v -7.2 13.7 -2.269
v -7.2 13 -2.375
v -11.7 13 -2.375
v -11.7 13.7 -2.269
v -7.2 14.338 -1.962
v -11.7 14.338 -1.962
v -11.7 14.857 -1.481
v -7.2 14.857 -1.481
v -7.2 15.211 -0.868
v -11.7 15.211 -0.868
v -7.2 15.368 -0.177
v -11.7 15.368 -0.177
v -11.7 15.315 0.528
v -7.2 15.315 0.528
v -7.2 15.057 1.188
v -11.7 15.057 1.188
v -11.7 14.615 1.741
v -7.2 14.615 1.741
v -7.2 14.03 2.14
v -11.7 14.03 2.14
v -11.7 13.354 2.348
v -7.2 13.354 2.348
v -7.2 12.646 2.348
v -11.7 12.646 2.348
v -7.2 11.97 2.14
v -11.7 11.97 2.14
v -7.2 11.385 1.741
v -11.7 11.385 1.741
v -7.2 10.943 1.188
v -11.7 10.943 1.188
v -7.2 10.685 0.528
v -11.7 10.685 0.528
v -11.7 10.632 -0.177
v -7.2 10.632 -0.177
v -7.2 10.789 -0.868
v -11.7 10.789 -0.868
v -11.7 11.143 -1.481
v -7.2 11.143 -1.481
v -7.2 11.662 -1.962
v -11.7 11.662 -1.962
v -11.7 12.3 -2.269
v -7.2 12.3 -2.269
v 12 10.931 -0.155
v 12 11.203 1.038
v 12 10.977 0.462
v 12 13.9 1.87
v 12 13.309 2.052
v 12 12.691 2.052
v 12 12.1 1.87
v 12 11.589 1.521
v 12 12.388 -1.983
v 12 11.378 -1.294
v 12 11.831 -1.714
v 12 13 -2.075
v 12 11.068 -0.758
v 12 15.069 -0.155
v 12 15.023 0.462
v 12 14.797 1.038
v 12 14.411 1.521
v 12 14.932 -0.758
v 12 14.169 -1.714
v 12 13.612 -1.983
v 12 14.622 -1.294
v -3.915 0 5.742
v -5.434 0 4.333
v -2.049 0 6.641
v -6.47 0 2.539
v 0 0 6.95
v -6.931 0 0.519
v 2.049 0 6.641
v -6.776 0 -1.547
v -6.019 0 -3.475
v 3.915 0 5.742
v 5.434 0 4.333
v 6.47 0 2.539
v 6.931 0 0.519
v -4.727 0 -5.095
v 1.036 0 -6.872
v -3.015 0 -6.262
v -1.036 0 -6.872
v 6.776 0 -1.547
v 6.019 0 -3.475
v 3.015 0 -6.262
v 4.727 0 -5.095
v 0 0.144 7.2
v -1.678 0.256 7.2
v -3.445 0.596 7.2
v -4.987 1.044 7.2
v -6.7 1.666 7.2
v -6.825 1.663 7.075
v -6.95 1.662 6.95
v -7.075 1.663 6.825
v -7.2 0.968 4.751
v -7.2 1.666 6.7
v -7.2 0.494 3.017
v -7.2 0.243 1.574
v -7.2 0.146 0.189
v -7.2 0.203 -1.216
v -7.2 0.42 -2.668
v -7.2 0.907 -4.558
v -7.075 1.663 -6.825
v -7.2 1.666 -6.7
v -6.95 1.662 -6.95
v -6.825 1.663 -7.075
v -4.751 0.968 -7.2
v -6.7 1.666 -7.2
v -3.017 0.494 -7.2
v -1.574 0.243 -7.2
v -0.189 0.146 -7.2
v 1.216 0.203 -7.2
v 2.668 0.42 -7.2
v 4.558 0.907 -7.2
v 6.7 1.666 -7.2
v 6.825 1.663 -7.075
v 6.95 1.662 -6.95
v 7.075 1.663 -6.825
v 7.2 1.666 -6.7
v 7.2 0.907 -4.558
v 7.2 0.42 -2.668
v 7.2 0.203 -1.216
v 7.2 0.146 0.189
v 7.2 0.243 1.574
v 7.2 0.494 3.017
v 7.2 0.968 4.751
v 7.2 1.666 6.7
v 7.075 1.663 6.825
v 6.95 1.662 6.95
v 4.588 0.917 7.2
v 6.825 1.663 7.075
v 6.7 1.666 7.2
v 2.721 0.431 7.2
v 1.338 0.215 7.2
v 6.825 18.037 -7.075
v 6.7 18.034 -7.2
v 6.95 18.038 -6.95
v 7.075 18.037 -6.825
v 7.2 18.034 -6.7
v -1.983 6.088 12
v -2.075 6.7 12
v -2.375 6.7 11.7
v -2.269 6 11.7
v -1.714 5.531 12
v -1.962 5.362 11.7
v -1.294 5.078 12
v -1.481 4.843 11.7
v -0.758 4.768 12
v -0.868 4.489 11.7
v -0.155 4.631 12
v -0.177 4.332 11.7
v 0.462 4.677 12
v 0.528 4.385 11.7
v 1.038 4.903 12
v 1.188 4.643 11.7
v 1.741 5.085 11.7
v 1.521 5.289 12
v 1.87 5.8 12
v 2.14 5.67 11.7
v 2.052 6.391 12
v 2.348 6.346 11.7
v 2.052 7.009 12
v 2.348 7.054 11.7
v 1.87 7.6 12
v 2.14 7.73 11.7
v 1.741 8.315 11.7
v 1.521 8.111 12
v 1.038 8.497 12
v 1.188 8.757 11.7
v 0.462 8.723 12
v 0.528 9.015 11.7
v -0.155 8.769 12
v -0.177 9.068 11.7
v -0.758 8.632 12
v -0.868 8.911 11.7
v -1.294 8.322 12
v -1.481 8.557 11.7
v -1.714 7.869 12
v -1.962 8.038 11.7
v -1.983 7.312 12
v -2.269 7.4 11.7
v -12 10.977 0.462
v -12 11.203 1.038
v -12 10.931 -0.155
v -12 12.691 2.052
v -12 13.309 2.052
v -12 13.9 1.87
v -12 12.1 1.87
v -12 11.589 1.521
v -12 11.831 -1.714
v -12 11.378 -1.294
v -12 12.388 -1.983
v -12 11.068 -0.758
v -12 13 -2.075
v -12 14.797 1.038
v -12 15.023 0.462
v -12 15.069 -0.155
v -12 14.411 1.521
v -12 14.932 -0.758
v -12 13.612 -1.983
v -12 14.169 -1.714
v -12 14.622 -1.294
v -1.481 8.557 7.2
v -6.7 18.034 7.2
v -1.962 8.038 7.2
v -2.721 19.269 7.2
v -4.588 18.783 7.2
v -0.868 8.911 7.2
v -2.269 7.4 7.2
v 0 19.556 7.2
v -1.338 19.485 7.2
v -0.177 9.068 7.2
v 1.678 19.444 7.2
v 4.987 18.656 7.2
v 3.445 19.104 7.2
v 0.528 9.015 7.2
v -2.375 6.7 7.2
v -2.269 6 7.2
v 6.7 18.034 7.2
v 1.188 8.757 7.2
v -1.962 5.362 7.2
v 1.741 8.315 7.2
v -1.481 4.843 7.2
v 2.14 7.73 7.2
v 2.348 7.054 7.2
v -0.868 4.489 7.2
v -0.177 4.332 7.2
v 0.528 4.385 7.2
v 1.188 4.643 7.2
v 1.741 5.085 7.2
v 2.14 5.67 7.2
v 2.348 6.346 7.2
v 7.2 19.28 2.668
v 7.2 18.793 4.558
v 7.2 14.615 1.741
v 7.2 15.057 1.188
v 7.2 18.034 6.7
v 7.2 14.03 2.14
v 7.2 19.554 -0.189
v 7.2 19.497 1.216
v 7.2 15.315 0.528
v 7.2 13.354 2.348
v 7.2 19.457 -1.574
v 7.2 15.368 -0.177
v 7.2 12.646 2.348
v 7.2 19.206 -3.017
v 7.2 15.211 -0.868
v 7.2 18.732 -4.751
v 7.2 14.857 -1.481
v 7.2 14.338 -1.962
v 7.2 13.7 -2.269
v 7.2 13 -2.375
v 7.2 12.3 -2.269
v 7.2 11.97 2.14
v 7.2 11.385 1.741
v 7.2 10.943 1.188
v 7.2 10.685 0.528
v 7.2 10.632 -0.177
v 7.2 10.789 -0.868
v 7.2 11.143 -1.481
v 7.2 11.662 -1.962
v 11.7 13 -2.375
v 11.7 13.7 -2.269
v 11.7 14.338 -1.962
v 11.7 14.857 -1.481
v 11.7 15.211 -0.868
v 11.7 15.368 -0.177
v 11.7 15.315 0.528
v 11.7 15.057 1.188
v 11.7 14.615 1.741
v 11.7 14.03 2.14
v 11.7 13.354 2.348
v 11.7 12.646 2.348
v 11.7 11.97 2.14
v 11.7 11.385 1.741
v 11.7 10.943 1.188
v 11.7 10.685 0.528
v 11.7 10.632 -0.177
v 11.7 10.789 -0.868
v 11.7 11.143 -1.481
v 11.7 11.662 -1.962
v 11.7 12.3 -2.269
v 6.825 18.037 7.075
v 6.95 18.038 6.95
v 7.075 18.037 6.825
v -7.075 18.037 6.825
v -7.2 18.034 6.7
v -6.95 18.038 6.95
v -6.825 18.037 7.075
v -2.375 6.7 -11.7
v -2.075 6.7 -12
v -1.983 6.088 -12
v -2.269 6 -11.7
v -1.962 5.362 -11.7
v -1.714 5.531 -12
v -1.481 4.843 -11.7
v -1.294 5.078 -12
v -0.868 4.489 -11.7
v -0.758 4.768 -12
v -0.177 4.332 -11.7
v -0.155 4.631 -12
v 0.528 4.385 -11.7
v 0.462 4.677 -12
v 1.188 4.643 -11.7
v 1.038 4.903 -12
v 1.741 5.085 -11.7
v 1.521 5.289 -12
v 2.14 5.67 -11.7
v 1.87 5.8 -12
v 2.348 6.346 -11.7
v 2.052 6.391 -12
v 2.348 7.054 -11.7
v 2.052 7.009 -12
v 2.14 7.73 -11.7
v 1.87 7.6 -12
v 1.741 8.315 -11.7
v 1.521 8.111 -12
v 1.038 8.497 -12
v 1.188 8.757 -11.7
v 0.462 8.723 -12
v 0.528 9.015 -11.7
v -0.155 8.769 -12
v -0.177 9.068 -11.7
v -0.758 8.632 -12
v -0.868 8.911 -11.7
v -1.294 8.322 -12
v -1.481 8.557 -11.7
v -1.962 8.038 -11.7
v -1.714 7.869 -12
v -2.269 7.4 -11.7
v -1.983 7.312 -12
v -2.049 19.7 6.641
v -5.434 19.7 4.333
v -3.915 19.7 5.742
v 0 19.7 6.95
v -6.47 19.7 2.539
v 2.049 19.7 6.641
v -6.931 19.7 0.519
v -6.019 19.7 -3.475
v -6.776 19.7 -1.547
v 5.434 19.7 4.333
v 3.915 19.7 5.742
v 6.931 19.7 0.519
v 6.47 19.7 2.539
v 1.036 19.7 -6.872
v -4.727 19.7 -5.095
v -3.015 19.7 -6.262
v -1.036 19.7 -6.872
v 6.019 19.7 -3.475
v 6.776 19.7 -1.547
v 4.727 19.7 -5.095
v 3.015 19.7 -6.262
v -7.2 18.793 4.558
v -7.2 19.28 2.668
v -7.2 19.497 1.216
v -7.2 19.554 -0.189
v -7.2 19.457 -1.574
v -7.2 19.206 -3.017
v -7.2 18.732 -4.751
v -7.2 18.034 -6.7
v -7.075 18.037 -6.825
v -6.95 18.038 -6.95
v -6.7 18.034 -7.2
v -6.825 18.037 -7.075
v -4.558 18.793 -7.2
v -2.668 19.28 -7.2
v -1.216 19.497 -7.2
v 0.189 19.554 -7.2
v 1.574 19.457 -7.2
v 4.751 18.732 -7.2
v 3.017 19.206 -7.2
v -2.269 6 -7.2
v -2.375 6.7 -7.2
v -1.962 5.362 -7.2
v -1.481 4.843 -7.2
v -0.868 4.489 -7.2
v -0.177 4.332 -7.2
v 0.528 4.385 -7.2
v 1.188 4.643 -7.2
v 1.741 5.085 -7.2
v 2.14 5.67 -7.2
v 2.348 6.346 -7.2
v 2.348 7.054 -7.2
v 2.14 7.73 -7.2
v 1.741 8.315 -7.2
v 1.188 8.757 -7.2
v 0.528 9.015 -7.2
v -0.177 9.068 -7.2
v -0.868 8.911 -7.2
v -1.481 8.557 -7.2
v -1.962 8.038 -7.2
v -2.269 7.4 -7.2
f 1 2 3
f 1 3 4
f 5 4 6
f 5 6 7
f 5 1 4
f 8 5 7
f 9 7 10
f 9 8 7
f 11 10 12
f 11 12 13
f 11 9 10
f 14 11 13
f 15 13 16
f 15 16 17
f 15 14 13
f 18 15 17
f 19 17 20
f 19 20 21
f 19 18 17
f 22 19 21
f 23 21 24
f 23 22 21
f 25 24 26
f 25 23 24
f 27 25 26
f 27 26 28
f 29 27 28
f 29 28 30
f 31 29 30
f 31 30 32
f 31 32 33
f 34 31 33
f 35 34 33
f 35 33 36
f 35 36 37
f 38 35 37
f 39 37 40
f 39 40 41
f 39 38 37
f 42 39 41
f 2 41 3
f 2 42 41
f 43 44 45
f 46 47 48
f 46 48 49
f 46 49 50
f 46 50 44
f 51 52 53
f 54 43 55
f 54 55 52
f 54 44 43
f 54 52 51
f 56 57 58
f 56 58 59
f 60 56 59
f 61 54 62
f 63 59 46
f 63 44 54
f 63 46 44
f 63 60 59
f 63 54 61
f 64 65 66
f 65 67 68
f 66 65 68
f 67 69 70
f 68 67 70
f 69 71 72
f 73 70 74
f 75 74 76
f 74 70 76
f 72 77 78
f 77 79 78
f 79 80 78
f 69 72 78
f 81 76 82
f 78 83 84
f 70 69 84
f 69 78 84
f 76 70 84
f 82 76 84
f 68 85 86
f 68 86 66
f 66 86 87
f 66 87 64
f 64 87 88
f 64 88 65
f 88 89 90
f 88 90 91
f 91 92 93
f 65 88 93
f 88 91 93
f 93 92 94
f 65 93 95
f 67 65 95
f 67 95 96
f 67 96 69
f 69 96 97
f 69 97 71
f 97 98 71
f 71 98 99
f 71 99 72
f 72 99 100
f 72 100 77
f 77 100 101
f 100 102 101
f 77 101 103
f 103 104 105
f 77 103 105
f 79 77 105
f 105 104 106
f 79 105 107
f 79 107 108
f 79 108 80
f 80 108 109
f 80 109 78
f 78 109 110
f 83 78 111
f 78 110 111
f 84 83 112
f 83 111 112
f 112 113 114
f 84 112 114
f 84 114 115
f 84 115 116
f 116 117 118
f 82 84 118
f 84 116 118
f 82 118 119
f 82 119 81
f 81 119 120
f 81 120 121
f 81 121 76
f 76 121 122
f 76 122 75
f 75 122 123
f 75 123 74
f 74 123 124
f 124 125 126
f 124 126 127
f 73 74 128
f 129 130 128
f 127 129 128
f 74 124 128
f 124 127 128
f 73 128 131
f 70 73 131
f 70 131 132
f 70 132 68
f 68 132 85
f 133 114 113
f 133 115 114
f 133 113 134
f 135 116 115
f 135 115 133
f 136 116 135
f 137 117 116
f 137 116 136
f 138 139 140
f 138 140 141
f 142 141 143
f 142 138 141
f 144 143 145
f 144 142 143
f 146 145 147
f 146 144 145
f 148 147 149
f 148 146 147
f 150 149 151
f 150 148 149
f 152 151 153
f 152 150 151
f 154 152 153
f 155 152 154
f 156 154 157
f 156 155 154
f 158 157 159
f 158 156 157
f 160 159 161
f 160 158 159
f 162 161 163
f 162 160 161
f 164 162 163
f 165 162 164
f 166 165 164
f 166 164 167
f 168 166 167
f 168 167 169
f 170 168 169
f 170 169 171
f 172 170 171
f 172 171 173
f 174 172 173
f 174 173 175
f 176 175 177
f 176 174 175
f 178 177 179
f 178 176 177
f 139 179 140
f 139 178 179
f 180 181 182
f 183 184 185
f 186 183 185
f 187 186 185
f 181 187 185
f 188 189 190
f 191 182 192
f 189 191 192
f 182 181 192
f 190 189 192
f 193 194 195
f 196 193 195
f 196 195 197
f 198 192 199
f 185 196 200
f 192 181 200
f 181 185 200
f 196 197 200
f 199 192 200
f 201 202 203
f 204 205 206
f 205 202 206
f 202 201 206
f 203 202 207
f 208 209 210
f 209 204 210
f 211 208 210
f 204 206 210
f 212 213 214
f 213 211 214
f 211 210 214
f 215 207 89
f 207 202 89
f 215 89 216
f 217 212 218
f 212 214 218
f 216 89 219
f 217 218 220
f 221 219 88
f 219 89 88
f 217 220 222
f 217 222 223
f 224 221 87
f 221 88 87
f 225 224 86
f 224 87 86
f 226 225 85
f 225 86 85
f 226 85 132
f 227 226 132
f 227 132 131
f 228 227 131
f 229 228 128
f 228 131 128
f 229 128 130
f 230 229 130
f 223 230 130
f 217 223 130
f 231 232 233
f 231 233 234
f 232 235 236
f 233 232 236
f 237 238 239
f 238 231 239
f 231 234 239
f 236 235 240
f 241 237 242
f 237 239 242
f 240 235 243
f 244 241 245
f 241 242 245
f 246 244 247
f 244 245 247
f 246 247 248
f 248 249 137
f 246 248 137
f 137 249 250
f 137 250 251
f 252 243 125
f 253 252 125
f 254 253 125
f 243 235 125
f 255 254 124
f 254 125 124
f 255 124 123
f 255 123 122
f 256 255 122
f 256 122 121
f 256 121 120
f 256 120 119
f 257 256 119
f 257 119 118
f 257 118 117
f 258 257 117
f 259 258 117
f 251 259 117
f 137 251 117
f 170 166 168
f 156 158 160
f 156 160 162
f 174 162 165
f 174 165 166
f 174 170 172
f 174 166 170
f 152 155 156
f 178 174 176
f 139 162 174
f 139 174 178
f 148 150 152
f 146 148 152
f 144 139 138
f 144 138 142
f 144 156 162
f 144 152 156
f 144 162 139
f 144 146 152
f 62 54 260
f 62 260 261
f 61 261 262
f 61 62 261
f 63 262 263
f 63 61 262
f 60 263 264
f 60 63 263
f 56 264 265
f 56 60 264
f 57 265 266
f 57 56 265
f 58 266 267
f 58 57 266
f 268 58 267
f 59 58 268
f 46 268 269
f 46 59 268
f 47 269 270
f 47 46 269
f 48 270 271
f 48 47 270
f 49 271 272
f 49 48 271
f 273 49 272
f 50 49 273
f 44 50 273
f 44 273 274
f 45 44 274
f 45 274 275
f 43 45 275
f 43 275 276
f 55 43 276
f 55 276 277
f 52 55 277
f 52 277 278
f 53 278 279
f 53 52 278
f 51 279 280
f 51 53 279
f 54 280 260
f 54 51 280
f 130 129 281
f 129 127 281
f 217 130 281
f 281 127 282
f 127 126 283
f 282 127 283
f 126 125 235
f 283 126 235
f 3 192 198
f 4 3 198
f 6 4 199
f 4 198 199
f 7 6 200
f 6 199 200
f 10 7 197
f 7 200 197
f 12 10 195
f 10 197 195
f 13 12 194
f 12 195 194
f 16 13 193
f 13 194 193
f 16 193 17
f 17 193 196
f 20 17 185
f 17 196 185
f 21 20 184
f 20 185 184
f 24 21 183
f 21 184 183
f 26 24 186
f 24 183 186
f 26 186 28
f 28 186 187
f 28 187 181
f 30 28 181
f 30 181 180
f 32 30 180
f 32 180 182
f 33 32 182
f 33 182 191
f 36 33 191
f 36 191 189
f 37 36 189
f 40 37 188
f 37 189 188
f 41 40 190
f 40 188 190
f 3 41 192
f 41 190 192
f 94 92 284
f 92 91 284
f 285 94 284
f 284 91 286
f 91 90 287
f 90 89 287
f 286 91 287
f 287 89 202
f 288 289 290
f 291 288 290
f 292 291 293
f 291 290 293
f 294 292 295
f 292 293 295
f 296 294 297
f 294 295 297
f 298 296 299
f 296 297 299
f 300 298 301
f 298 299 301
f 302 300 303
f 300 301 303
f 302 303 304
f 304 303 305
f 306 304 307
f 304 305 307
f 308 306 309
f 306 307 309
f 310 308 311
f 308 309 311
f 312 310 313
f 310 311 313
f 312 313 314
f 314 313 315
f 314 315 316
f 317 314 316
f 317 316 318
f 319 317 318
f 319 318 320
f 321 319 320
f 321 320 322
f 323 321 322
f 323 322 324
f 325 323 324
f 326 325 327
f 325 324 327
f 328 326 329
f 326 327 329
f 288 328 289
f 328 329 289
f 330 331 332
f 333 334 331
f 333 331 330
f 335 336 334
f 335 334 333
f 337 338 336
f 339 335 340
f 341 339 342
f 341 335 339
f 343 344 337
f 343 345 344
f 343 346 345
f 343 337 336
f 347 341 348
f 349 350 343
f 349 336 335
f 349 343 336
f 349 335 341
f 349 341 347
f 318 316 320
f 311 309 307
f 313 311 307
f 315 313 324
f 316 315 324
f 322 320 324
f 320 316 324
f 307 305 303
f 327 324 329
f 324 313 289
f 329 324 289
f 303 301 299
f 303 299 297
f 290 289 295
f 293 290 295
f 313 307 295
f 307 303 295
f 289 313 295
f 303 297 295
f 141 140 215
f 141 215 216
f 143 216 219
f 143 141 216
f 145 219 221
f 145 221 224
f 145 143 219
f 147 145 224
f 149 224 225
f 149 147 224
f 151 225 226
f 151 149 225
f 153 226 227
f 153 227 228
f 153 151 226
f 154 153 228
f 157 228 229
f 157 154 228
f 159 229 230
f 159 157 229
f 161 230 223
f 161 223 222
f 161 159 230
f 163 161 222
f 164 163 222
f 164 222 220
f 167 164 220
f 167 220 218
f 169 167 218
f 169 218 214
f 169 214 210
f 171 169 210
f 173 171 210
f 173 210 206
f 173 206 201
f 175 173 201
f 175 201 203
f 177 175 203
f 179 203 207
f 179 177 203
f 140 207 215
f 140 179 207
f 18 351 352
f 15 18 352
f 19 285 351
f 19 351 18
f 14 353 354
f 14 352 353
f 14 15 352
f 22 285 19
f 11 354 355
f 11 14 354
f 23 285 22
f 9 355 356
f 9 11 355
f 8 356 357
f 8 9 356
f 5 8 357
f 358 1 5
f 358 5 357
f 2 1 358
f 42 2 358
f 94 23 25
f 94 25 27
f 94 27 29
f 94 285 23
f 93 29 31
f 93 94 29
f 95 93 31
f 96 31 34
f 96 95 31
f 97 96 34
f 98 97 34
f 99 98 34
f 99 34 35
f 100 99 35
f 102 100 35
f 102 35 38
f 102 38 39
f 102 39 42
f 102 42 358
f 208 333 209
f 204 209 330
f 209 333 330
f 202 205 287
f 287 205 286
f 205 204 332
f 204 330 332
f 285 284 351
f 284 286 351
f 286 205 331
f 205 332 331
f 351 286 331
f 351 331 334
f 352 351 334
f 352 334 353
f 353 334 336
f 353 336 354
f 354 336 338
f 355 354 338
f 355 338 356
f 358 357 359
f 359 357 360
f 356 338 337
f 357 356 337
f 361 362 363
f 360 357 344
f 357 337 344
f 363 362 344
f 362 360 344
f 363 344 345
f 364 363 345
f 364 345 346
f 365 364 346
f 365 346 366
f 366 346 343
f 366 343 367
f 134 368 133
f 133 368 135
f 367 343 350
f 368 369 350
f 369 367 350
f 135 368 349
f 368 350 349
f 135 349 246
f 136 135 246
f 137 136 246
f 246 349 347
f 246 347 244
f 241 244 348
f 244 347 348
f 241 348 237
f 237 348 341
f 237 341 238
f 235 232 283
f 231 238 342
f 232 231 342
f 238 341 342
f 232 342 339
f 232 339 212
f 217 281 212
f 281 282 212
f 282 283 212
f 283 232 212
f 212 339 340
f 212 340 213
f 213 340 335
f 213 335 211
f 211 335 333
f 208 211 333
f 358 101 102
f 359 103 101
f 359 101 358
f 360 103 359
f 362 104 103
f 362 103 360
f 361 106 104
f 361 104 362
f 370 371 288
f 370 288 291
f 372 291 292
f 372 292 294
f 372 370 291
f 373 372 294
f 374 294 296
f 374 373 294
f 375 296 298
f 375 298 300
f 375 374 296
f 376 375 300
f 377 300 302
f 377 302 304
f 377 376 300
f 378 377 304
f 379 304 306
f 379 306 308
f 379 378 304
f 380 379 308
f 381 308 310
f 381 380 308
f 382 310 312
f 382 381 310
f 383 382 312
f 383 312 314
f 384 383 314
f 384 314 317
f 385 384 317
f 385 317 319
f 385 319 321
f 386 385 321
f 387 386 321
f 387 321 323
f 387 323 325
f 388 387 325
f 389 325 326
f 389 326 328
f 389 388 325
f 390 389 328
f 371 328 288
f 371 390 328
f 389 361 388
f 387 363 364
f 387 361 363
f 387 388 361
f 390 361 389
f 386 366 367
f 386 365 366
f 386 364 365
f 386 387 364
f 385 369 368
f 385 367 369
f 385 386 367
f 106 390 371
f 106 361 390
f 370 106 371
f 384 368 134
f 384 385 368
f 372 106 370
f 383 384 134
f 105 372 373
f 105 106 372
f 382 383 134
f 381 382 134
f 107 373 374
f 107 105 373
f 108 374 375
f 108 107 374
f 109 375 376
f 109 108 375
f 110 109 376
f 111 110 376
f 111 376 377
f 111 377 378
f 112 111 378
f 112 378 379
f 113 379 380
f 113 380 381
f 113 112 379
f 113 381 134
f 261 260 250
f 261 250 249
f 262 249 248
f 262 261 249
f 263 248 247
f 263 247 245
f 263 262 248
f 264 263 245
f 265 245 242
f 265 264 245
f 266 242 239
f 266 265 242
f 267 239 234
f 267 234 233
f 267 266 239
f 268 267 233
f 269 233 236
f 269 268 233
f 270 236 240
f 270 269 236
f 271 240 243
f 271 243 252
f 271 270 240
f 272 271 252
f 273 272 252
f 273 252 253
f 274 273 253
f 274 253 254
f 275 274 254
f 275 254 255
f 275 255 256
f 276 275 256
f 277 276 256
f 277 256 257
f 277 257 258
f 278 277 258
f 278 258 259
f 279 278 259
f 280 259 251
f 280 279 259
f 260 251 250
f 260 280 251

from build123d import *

# Parameters (mm, degrees)
SKETCH1_W           = 14.4
SKETCH1_H           = 14.4
BOSS_EXTRUDE1_DEPTH = 19.7
SKETCH3_R           = 2.375
BOSS_EXTRUDE2_DEPTH = 12
SKETCH4_R           = 2.375
BOSS_EXTRUDE3_DEPTH = 12
CHAMFER1_SIZE       = 0.3
CHAMFER2_SIZE       = 0.5


with BuildPart() as part:
    # Sketch1 → Boss-Extrude1 (new body)
    with BuildSketch(Plane(origin=(0, 0, 0), x_dir=(1, 0, 0), z_dir=(0, 1, 0))):
        Rectangle(SKETCH1_W, SKETCH1_H)
    extrude(amount=BOSS_EXTRUDE1_DEPTH)

    # Sketch2 → Cut-Revolve1 (revolve, cut)
    with BuildSketch(Plane.XY, mode=Mode.PRIVATE) as cut_revolve1_sk:
        Polygon((-6.95, 19.7), (-16.09, 19.7), (-16.09, 0), (-6.95, 0), (-13.55, 3.810511777), (-13.55, 15.889488223), align=None)
    revolve(cut_revolve1_sk.sketch.rotate(Axis((0, 20.685, 0), (0, -1, 0)), 270), axis=Axis((0, 20.685, 0), (0, -1, 0)), mode=Mode.SUBTRACT)

    # Sketch3 → Boss-Extrude2 (add, symmetric)
    with BuildSketch(Plane.XY):
        with Locations(Location((0, 6.7, 0), (0, 0, 180))):
            Circle(SKETCH3_R)
    extrude(amount=BOSS_EXTRUDE2_DEPTH, both=True)

    # Sketch4 → Boss-Extrude3 (add, symmetric)
    with BuildSketch(Plane(origin=(0, 0, 0), x_dir=(0, 0, -1), z_dir=(1, 0, 0))):
        with Locations((0, 13)):
            Circle(SKETCH4_R)
    extrude(amount=BOSS_EXTRUDE3_DEPTH, both=True)

    # Chamfer1
    chamfer1_edges = [part.edges().sort_by_distance(p)[0] for p in [
        (2.375, 6.7, -12),
        (2.375, 6.7, 12),
        (-12, 13, 2.375),
        (12, 13, 2.375),
    ]]
    chamfer(chamfer1_edges, length=CHAMFER1_SIZE)

    # Chamfer2
    chamfer2_edges = [part.edges().sort_by_distance(p)[0] for p in [
        (7.2, 9.85, 7.2),
        (7.2, 9.85, -7.2),
        (-7.2, 9.85, 7.2),
        (-7.2, 9.85, -7.2),
    ]]
    chamfer(chamfer2_edges, length=CHAMFER2_SIZE)


solid = part.part
